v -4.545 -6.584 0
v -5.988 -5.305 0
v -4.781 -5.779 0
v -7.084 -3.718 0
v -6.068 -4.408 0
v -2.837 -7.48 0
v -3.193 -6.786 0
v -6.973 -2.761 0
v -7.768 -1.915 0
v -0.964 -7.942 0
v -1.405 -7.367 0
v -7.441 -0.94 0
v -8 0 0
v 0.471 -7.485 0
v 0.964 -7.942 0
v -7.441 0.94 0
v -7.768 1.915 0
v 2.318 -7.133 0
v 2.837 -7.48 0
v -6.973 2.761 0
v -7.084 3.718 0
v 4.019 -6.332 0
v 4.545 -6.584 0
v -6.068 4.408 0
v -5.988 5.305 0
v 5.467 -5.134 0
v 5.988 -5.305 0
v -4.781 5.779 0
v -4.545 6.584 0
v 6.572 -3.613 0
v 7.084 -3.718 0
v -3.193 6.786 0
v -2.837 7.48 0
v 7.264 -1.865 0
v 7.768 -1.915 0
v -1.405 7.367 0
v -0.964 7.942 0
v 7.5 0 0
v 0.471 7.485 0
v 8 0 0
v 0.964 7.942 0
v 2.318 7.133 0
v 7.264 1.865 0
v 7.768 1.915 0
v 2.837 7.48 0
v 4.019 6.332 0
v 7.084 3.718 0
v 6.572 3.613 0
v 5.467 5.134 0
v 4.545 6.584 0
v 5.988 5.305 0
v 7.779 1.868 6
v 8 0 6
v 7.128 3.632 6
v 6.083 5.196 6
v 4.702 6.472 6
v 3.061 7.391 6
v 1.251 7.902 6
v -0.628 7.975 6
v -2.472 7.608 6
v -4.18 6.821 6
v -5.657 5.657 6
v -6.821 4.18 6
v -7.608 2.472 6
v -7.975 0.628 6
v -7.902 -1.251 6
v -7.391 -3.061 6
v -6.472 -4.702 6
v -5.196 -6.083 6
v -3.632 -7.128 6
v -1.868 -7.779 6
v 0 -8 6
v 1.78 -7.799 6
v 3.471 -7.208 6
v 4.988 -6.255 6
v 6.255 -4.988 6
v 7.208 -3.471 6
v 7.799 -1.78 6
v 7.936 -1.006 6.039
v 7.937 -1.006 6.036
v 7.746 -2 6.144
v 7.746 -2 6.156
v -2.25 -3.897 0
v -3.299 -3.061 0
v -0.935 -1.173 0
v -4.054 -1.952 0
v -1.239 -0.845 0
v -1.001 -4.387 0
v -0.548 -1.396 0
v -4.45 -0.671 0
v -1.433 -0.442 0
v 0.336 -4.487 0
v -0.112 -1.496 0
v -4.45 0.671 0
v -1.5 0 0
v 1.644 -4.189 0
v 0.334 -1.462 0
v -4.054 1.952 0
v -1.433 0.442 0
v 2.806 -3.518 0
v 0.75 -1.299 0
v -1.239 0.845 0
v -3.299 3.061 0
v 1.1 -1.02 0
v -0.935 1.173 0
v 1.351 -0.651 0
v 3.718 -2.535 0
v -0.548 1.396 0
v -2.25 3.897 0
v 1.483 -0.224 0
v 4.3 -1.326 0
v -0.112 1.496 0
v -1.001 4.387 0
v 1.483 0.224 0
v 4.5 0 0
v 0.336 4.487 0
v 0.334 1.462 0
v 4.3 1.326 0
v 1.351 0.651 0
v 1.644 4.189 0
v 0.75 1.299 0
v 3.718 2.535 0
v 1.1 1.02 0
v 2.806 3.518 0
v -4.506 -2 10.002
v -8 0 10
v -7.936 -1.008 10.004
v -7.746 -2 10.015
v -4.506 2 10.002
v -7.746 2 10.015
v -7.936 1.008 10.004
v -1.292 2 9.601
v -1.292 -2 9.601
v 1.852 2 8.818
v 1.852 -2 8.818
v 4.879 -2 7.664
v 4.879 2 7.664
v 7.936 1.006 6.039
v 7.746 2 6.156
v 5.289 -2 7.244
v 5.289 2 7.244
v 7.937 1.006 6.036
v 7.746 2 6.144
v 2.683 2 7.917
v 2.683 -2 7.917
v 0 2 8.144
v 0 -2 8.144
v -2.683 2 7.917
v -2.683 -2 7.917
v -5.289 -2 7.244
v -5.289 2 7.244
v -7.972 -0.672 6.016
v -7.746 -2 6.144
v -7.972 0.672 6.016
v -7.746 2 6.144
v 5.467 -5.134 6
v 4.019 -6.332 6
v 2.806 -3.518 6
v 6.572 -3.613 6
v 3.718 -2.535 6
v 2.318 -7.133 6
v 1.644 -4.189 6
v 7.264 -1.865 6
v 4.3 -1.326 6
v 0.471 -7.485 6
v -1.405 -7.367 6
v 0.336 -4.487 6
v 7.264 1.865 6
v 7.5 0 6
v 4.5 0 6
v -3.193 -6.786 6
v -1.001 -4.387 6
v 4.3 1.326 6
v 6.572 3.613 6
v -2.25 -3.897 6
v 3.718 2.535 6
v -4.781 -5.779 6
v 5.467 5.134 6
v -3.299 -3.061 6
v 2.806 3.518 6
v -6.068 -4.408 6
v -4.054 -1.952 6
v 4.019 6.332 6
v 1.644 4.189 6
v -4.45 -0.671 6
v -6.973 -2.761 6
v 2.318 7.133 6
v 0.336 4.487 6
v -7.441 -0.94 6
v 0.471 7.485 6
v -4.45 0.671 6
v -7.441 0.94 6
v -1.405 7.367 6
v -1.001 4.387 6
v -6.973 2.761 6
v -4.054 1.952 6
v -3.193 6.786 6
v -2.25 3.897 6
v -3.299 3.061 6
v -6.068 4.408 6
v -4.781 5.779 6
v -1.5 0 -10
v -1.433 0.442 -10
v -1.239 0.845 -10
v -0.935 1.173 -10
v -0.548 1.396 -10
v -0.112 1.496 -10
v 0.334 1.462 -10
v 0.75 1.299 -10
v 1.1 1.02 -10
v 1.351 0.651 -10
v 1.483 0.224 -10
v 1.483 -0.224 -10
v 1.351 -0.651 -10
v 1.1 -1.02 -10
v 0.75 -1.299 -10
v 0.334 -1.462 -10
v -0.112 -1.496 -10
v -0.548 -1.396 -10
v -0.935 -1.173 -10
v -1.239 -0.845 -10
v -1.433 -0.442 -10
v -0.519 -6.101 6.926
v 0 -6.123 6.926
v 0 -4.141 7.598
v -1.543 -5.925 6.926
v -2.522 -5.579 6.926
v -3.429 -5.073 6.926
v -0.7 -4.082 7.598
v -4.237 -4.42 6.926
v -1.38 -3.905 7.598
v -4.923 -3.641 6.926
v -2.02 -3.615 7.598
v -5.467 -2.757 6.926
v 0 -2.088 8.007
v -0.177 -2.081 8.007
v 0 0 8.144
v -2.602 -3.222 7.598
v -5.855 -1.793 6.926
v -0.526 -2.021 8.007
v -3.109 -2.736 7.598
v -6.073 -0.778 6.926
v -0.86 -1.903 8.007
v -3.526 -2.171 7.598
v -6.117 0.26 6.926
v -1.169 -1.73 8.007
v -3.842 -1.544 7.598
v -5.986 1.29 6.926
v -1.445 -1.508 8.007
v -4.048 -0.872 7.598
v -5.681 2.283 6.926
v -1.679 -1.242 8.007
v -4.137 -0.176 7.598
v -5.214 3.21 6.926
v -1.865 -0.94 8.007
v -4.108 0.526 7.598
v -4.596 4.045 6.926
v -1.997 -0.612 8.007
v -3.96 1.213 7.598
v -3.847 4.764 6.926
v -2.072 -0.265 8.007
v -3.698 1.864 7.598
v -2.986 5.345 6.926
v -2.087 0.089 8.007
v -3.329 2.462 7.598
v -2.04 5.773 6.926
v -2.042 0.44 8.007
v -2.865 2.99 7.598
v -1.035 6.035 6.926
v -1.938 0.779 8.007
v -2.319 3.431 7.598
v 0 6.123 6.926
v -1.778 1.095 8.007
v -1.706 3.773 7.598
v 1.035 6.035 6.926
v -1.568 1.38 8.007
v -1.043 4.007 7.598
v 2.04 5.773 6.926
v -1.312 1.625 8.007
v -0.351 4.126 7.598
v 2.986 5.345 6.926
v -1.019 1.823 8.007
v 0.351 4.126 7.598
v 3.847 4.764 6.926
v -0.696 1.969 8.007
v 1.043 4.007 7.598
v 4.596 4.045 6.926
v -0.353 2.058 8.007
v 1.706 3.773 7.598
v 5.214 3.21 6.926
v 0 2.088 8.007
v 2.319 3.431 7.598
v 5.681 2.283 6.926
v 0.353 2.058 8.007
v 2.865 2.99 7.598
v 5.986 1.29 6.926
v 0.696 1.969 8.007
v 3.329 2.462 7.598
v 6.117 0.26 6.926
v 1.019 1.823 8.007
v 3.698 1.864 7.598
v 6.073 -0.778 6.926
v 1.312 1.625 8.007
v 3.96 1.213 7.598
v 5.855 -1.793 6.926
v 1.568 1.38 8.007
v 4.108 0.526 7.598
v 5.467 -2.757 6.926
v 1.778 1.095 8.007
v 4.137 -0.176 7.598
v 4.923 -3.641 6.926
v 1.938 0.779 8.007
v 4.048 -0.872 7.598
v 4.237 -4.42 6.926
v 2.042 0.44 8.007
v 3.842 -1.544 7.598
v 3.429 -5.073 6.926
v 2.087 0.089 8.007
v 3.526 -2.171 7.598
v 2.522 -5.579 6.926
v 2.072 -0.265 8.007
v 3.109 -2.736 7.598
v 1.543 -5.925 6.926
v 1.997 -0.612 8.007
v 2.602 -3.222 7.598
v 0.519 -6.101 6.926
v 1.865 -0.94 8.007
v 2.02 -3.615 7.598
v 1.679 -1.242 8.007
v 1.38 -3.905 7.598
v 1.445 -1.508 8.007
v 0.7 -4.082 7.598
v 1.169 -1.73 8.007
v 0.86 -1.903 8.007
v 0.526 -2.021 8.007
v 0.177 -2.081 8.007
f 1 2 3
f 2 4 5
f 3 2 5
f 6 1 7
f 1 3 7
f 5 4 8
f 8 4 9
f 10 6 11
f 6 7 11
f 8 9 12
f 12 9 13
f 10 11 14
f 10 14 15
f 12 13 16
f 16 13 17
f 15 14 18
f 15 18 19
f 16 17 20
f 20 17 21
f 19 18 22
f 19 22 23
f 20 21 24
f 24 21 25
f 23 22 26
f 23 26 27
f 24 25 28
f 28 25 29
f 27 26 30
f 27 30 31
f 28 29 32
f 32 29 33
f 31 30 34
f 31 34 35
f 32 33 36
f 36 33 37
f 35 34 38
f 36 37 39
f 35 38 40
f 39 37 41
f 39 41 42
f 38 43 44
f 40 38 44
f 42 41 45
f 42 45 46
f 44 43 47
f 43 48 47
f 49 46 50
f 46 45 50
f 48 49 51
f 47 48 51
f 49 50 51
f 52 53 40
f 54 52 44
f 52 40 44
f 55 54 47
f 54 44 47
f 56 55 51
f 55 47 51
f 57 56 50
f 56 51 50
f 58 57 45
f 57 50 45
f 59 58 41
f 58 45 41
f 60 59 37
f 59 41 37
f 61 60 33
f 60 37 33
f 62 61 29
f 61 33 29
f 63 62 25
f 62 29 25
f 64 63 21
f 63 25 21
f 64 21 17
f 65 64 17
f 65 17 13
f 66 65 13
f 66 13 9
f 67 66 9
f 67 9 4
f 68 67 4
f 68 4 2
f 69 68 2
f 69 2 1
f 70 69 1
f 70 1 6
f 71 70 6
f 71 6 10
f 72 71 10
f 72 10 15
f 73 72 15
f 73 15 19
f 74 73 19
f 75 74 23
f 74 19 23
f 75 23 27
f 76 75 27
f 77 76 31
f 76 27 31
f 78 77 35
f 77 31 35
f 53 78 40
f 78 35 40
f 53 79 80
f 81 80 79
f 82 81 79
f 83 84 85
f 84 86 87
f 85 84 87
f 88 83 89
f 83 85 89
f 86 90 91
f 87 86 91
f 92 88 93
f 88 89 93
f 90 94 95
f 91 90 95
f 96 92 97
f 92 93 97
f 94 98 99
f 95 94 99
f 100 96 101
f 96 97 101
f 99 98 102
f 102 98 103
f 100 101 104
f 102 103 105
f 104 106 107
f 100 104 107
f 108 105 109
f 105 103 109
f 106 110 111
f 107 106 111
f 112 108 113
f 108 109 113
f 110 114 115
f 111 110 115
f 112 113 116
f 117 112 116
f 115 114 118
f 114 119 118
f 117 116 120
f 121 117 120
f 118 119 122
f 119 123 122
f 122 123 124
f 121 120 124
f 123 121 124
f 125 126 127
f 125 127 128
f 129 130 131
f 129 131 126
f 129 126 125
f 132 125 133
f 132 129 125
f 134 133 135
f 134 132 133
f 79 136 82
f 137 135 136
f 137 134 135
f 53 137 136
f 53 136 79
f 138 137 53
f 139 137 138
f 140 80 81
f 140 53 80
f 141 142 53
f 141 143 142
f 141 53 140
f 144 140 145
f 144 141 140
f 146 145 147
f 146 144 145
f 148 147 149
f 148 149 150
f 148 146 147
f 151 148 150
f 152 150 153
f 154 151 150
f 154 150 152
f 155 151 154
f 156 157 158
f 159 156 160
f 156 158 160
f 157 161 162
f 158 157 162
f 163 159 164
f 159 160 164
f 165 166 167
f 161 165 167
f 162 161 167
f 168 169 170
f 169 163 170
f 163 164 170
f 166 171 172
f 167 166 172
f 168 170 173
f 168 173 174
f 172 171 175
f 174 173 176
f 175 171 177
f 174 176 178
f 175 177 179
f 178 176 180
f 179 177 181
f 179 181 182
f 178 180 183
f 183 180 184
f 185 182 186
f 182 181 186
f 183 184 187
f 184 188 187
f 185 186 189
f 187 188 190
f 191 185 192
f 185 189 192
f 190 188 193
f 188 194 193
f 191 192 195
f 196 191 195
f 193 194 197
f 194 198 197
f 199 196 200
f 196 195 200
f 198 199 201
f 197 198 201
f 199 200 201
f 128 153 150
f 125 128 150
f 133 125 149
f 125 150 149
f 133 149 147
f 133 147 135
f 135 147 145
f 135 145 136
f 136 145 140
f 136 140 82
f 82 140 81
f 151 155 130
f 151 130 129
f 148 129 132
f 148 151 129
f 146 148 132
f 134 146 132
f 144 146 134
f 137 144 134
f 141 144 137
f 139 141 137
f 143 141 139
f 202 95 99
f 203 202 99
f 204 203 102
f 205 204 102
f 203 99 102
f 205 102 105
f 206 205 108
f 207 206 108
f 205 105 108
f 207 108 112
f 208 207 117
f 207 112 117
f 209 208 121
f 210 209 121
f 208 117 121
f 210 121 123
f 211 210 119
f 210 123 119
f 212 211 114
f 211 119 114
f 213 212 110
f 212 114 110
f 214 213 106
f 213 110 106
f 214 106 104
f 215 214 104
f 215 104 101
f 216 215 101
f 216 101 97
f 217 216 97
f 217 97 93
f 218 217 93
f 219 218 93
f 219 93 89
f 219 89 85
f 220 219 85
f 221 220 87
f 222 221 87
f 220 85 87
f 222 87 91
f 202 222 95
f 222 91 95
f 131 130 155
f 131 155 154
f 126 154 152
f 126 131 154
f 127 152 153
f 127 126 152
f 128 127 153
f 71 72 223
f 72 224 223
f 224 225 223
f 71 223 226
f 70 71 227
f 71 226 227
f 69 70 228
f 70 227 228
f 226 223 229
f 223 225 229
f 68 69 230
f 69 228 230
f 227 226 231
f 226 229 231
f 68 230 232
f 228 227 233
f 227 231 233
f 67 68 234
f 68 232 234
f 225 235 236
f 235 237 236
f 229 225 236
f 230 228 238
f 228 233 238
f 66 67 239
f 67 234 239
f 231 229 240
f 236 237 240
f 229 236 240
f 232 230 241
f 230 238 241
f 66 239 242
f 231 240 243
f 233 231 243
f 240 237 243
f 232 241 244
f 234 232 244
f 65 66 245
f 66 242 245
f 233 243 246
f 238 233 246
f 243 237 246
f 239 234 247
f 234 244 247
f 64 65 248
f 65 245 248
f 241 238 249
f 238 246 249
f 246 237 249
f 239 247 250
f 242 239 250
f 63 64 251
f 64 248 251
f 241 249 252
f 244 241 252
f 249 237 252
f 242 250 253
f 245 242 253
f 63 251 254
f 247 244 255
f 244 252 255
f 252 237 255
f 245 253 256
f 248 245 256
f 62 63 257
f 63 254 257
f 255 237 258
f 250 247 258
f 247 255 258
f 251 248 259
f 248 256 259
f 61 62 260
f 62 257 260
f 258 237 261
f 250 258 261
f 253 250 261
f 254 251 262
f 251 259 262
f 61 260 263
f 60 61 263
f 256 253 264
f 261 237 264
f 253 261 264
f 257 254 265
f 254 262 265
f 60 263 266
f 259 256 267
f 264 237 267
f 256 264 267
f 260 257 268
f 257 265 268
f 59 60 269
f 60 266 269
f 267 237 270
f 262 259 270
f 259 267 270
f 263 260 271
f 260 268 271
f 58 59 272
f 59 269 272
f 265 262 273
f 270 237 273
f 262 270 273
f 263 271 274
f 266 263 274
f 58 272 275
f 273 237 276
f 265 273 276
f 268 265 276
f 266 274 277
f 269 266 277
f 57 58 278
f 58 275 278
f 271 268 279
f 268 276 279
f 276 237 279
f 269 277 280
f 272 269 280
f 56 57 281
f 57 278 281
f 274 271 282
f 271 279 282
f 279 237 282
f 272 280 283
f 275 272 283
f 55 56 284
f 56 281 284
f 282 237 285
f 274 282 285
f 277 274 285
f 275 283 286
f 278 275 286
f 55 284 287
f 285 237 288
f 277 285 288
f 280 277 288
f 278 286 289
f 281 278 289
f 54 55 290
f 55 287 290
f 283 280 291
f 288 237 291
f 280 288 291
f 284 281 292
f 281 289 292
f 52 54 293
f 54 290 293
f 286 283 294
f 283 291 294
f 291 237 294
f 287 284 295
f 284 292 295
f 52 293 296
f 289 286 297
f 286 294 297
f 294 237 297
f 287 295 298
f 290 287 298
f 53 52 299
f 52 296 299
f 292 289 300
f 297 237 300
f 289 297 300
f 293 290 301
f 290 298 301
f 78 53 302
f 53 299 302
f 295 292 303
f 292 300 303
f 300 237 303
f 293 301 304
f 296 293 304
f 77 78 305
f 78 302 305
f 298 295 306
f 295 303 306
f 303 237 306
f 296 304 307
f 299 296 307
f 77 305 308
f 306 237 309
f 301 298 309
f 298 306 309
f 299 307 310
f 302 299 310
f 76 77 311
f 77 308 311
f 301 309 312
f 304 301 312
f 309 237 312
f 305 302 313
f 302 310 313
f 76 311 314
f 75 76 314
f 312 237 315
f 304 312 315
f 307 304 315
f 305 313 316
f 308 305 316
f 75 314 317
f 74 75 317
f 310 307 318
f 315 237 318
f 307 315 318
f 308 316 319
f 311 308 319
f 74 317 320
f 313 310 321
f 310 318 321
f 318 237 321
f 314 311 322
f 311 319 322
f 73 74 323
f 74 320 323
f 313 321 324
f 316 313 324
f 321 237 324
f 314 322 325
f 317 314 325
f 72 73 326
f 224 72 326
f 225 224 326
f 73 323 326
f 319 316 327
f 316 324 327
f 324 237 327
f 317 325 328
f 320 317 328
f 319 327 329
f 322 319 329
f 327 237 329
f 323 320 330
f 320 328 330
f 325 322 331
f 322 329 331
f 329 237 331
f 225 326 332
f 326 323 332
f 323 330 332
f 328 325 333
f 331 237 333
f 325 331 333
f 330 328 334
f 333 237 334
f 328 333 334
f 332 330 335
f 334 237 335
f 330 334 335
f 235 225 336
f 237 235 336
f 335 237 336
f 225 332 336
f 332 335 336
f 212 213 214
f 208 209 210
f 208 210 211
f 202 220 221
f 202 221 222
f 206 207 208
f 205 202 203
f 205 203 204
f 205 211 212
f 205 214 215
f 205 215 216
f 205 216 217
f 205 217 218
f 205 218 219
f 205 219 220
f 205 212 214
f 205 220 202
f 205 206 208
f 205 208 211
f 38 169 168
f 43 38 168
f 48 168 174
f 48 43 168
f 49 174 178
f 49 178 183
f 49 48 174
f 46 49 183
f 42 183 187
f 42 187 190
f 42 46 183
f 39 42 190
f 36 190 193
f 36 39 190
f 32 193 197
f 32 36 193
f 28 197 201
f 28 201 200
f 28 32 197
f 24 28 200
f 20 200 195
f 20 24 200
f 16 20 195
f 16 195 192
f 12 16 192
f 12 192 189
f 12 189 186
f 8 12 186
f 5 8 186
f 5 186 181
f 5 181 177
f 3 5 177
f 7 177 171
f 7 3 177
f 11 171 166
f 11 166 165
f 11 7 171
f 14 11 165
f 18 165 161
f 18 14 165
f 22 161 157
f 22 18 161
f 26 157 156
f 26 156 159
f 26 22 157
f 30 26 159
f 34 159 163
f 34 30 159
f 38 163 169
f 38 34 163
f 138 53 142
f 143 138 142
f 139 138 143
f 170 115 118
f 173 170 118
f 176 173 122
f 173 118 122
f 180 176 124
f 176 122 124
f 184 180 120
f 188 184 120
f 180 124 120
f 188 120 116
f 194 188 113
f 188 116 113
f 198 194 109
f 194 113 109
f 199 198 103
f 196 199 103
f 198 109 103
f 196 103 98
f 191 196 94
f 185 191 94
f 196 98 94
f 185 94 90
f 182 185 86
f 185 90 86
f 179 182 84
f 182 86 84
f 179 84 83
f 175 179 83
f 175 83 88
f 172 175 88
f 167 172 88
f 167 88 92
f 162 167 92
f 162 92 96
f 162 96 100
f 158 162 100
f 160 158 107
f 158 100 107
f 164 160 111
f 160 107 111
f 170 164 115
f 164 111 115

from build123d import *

# Parameters (mm, degrees)
SKETCH1_R                = 4.5
BOSS_EXTRUDE1_DEPTH      = 6
SKETCH1_R_2              = 8
SKETCH1_R_3              = 7.5
BOSS_EXTRUDE1_2_DEPTH    = 6
SKETCH8_R                = 1.5
BOSS_EXTRUDE3_DEPTH      = 10
BOSS_EXTRUDE4_DEPTH      = 2
BOSS_EXTRUDE4_DEPTH_BACK = 2
CUT_EXTRUDE1_DEPTH       = 2
CUT_EXTRUDE1_DEPTH_BACK  = 15
SKETCH10_R               = 8.273287204
SKETCH10_R_2             = 8


with BuildPart() as part:
    # Sketch1 → Boss-Extrude1 (new body)
    with BuildSketch(Plane.XY):
        Circle(SKETCH1_R)
    extrude(amount=BOSS_EXTRUDE1_DEPTH)



with BuildPart() as body_2:
    # Sketch1 → Boss-Extrude1 2 (new body)
    with BuildSketch(Plane.XY):
        Circle(SKETCH1_R_2)
        Circle(SKETCH1_R_3, mode=Mode.SUBTRACT)
    extrude(amount=BOSS_EXTRUDE1_2_DEPTH)


with BuildPart() as part_1:
    add(part.part)

    add(body_2.part)  # Revolve1 merges body 2
    # Sketch4 → Revolve1 (revolve)
    with BuildSketch(Plane(origin=(0, 0, 0), x_dir=(0, 0, -1), z_dir=(1, 0, 0))):
        with BuildLine():
            Line((-8.143593539, 0), (-6, 0))
            Line((-6, 0), (-6, -8))
            ThreePointArc((-6, -8), (-7.59840676, -4.141104722), (-8.143593539, 0))
        make_face()
    revolve(axis=Axis((0, 0, 228.477181529), (0, 0, -1)))

    # Sketch8 → Boss-Extrude3 (add)
    with BuildSketch(Plane(origin=(0, 0, 0), x_dir=(-1, 0, 0), z_dir=(0, 0, -1))):
        Circle(SKETCH8_R)
    extrude(amount=BOSS_EXTRUDE3_DEPTH)


with BuildPart() as body_2_2:
    # Sketch9 → Boss-Extrude4 (new, two sides: drawn at the far end of the back side and taken through both)
    with BuildSketch(Plane(origin=(0, 0, 0), x_dir=(1, 0, 0), z_dir=(0, 1, 0)).offset(-BOSS_EXTRUDE4_DEPTH_BACK)):
        with BuildLine():
            Line((-8, -6), (-8, -10))
            ThreePointArc((-8, -10), (0.312890295, -9.25156118), (8, -6))
            ThreePointArc((8, -6), (0, -8.143593539), (-8, -6))
        make_face()
    extrude(amount=BOSS_EXTRUDE4_DEPTH + BOSS_EXTRUDE4_DEPTH_BACK)

    # Sketch10 → Cut-Extrude1 (cut, two sides: drawn at the far end of the back side and taken through both)
    with BuildSketch(Plane.XY.offset(10).offset(-CUT_EXTRUDE1_DEPTH_BACK)):
        Circle(SKETCH10_R)
        Circle(SKETCH10_R_2, mode=Mode.SUBTRACT)
    extrude(amount=CUT_EXTRUDE1_DEPTH + CUT_EXTRUDE1_DEPTH_BACK, mode=Mode.SUBTRACT)


solid = Compound([part_1.part, body_2_2.part])
